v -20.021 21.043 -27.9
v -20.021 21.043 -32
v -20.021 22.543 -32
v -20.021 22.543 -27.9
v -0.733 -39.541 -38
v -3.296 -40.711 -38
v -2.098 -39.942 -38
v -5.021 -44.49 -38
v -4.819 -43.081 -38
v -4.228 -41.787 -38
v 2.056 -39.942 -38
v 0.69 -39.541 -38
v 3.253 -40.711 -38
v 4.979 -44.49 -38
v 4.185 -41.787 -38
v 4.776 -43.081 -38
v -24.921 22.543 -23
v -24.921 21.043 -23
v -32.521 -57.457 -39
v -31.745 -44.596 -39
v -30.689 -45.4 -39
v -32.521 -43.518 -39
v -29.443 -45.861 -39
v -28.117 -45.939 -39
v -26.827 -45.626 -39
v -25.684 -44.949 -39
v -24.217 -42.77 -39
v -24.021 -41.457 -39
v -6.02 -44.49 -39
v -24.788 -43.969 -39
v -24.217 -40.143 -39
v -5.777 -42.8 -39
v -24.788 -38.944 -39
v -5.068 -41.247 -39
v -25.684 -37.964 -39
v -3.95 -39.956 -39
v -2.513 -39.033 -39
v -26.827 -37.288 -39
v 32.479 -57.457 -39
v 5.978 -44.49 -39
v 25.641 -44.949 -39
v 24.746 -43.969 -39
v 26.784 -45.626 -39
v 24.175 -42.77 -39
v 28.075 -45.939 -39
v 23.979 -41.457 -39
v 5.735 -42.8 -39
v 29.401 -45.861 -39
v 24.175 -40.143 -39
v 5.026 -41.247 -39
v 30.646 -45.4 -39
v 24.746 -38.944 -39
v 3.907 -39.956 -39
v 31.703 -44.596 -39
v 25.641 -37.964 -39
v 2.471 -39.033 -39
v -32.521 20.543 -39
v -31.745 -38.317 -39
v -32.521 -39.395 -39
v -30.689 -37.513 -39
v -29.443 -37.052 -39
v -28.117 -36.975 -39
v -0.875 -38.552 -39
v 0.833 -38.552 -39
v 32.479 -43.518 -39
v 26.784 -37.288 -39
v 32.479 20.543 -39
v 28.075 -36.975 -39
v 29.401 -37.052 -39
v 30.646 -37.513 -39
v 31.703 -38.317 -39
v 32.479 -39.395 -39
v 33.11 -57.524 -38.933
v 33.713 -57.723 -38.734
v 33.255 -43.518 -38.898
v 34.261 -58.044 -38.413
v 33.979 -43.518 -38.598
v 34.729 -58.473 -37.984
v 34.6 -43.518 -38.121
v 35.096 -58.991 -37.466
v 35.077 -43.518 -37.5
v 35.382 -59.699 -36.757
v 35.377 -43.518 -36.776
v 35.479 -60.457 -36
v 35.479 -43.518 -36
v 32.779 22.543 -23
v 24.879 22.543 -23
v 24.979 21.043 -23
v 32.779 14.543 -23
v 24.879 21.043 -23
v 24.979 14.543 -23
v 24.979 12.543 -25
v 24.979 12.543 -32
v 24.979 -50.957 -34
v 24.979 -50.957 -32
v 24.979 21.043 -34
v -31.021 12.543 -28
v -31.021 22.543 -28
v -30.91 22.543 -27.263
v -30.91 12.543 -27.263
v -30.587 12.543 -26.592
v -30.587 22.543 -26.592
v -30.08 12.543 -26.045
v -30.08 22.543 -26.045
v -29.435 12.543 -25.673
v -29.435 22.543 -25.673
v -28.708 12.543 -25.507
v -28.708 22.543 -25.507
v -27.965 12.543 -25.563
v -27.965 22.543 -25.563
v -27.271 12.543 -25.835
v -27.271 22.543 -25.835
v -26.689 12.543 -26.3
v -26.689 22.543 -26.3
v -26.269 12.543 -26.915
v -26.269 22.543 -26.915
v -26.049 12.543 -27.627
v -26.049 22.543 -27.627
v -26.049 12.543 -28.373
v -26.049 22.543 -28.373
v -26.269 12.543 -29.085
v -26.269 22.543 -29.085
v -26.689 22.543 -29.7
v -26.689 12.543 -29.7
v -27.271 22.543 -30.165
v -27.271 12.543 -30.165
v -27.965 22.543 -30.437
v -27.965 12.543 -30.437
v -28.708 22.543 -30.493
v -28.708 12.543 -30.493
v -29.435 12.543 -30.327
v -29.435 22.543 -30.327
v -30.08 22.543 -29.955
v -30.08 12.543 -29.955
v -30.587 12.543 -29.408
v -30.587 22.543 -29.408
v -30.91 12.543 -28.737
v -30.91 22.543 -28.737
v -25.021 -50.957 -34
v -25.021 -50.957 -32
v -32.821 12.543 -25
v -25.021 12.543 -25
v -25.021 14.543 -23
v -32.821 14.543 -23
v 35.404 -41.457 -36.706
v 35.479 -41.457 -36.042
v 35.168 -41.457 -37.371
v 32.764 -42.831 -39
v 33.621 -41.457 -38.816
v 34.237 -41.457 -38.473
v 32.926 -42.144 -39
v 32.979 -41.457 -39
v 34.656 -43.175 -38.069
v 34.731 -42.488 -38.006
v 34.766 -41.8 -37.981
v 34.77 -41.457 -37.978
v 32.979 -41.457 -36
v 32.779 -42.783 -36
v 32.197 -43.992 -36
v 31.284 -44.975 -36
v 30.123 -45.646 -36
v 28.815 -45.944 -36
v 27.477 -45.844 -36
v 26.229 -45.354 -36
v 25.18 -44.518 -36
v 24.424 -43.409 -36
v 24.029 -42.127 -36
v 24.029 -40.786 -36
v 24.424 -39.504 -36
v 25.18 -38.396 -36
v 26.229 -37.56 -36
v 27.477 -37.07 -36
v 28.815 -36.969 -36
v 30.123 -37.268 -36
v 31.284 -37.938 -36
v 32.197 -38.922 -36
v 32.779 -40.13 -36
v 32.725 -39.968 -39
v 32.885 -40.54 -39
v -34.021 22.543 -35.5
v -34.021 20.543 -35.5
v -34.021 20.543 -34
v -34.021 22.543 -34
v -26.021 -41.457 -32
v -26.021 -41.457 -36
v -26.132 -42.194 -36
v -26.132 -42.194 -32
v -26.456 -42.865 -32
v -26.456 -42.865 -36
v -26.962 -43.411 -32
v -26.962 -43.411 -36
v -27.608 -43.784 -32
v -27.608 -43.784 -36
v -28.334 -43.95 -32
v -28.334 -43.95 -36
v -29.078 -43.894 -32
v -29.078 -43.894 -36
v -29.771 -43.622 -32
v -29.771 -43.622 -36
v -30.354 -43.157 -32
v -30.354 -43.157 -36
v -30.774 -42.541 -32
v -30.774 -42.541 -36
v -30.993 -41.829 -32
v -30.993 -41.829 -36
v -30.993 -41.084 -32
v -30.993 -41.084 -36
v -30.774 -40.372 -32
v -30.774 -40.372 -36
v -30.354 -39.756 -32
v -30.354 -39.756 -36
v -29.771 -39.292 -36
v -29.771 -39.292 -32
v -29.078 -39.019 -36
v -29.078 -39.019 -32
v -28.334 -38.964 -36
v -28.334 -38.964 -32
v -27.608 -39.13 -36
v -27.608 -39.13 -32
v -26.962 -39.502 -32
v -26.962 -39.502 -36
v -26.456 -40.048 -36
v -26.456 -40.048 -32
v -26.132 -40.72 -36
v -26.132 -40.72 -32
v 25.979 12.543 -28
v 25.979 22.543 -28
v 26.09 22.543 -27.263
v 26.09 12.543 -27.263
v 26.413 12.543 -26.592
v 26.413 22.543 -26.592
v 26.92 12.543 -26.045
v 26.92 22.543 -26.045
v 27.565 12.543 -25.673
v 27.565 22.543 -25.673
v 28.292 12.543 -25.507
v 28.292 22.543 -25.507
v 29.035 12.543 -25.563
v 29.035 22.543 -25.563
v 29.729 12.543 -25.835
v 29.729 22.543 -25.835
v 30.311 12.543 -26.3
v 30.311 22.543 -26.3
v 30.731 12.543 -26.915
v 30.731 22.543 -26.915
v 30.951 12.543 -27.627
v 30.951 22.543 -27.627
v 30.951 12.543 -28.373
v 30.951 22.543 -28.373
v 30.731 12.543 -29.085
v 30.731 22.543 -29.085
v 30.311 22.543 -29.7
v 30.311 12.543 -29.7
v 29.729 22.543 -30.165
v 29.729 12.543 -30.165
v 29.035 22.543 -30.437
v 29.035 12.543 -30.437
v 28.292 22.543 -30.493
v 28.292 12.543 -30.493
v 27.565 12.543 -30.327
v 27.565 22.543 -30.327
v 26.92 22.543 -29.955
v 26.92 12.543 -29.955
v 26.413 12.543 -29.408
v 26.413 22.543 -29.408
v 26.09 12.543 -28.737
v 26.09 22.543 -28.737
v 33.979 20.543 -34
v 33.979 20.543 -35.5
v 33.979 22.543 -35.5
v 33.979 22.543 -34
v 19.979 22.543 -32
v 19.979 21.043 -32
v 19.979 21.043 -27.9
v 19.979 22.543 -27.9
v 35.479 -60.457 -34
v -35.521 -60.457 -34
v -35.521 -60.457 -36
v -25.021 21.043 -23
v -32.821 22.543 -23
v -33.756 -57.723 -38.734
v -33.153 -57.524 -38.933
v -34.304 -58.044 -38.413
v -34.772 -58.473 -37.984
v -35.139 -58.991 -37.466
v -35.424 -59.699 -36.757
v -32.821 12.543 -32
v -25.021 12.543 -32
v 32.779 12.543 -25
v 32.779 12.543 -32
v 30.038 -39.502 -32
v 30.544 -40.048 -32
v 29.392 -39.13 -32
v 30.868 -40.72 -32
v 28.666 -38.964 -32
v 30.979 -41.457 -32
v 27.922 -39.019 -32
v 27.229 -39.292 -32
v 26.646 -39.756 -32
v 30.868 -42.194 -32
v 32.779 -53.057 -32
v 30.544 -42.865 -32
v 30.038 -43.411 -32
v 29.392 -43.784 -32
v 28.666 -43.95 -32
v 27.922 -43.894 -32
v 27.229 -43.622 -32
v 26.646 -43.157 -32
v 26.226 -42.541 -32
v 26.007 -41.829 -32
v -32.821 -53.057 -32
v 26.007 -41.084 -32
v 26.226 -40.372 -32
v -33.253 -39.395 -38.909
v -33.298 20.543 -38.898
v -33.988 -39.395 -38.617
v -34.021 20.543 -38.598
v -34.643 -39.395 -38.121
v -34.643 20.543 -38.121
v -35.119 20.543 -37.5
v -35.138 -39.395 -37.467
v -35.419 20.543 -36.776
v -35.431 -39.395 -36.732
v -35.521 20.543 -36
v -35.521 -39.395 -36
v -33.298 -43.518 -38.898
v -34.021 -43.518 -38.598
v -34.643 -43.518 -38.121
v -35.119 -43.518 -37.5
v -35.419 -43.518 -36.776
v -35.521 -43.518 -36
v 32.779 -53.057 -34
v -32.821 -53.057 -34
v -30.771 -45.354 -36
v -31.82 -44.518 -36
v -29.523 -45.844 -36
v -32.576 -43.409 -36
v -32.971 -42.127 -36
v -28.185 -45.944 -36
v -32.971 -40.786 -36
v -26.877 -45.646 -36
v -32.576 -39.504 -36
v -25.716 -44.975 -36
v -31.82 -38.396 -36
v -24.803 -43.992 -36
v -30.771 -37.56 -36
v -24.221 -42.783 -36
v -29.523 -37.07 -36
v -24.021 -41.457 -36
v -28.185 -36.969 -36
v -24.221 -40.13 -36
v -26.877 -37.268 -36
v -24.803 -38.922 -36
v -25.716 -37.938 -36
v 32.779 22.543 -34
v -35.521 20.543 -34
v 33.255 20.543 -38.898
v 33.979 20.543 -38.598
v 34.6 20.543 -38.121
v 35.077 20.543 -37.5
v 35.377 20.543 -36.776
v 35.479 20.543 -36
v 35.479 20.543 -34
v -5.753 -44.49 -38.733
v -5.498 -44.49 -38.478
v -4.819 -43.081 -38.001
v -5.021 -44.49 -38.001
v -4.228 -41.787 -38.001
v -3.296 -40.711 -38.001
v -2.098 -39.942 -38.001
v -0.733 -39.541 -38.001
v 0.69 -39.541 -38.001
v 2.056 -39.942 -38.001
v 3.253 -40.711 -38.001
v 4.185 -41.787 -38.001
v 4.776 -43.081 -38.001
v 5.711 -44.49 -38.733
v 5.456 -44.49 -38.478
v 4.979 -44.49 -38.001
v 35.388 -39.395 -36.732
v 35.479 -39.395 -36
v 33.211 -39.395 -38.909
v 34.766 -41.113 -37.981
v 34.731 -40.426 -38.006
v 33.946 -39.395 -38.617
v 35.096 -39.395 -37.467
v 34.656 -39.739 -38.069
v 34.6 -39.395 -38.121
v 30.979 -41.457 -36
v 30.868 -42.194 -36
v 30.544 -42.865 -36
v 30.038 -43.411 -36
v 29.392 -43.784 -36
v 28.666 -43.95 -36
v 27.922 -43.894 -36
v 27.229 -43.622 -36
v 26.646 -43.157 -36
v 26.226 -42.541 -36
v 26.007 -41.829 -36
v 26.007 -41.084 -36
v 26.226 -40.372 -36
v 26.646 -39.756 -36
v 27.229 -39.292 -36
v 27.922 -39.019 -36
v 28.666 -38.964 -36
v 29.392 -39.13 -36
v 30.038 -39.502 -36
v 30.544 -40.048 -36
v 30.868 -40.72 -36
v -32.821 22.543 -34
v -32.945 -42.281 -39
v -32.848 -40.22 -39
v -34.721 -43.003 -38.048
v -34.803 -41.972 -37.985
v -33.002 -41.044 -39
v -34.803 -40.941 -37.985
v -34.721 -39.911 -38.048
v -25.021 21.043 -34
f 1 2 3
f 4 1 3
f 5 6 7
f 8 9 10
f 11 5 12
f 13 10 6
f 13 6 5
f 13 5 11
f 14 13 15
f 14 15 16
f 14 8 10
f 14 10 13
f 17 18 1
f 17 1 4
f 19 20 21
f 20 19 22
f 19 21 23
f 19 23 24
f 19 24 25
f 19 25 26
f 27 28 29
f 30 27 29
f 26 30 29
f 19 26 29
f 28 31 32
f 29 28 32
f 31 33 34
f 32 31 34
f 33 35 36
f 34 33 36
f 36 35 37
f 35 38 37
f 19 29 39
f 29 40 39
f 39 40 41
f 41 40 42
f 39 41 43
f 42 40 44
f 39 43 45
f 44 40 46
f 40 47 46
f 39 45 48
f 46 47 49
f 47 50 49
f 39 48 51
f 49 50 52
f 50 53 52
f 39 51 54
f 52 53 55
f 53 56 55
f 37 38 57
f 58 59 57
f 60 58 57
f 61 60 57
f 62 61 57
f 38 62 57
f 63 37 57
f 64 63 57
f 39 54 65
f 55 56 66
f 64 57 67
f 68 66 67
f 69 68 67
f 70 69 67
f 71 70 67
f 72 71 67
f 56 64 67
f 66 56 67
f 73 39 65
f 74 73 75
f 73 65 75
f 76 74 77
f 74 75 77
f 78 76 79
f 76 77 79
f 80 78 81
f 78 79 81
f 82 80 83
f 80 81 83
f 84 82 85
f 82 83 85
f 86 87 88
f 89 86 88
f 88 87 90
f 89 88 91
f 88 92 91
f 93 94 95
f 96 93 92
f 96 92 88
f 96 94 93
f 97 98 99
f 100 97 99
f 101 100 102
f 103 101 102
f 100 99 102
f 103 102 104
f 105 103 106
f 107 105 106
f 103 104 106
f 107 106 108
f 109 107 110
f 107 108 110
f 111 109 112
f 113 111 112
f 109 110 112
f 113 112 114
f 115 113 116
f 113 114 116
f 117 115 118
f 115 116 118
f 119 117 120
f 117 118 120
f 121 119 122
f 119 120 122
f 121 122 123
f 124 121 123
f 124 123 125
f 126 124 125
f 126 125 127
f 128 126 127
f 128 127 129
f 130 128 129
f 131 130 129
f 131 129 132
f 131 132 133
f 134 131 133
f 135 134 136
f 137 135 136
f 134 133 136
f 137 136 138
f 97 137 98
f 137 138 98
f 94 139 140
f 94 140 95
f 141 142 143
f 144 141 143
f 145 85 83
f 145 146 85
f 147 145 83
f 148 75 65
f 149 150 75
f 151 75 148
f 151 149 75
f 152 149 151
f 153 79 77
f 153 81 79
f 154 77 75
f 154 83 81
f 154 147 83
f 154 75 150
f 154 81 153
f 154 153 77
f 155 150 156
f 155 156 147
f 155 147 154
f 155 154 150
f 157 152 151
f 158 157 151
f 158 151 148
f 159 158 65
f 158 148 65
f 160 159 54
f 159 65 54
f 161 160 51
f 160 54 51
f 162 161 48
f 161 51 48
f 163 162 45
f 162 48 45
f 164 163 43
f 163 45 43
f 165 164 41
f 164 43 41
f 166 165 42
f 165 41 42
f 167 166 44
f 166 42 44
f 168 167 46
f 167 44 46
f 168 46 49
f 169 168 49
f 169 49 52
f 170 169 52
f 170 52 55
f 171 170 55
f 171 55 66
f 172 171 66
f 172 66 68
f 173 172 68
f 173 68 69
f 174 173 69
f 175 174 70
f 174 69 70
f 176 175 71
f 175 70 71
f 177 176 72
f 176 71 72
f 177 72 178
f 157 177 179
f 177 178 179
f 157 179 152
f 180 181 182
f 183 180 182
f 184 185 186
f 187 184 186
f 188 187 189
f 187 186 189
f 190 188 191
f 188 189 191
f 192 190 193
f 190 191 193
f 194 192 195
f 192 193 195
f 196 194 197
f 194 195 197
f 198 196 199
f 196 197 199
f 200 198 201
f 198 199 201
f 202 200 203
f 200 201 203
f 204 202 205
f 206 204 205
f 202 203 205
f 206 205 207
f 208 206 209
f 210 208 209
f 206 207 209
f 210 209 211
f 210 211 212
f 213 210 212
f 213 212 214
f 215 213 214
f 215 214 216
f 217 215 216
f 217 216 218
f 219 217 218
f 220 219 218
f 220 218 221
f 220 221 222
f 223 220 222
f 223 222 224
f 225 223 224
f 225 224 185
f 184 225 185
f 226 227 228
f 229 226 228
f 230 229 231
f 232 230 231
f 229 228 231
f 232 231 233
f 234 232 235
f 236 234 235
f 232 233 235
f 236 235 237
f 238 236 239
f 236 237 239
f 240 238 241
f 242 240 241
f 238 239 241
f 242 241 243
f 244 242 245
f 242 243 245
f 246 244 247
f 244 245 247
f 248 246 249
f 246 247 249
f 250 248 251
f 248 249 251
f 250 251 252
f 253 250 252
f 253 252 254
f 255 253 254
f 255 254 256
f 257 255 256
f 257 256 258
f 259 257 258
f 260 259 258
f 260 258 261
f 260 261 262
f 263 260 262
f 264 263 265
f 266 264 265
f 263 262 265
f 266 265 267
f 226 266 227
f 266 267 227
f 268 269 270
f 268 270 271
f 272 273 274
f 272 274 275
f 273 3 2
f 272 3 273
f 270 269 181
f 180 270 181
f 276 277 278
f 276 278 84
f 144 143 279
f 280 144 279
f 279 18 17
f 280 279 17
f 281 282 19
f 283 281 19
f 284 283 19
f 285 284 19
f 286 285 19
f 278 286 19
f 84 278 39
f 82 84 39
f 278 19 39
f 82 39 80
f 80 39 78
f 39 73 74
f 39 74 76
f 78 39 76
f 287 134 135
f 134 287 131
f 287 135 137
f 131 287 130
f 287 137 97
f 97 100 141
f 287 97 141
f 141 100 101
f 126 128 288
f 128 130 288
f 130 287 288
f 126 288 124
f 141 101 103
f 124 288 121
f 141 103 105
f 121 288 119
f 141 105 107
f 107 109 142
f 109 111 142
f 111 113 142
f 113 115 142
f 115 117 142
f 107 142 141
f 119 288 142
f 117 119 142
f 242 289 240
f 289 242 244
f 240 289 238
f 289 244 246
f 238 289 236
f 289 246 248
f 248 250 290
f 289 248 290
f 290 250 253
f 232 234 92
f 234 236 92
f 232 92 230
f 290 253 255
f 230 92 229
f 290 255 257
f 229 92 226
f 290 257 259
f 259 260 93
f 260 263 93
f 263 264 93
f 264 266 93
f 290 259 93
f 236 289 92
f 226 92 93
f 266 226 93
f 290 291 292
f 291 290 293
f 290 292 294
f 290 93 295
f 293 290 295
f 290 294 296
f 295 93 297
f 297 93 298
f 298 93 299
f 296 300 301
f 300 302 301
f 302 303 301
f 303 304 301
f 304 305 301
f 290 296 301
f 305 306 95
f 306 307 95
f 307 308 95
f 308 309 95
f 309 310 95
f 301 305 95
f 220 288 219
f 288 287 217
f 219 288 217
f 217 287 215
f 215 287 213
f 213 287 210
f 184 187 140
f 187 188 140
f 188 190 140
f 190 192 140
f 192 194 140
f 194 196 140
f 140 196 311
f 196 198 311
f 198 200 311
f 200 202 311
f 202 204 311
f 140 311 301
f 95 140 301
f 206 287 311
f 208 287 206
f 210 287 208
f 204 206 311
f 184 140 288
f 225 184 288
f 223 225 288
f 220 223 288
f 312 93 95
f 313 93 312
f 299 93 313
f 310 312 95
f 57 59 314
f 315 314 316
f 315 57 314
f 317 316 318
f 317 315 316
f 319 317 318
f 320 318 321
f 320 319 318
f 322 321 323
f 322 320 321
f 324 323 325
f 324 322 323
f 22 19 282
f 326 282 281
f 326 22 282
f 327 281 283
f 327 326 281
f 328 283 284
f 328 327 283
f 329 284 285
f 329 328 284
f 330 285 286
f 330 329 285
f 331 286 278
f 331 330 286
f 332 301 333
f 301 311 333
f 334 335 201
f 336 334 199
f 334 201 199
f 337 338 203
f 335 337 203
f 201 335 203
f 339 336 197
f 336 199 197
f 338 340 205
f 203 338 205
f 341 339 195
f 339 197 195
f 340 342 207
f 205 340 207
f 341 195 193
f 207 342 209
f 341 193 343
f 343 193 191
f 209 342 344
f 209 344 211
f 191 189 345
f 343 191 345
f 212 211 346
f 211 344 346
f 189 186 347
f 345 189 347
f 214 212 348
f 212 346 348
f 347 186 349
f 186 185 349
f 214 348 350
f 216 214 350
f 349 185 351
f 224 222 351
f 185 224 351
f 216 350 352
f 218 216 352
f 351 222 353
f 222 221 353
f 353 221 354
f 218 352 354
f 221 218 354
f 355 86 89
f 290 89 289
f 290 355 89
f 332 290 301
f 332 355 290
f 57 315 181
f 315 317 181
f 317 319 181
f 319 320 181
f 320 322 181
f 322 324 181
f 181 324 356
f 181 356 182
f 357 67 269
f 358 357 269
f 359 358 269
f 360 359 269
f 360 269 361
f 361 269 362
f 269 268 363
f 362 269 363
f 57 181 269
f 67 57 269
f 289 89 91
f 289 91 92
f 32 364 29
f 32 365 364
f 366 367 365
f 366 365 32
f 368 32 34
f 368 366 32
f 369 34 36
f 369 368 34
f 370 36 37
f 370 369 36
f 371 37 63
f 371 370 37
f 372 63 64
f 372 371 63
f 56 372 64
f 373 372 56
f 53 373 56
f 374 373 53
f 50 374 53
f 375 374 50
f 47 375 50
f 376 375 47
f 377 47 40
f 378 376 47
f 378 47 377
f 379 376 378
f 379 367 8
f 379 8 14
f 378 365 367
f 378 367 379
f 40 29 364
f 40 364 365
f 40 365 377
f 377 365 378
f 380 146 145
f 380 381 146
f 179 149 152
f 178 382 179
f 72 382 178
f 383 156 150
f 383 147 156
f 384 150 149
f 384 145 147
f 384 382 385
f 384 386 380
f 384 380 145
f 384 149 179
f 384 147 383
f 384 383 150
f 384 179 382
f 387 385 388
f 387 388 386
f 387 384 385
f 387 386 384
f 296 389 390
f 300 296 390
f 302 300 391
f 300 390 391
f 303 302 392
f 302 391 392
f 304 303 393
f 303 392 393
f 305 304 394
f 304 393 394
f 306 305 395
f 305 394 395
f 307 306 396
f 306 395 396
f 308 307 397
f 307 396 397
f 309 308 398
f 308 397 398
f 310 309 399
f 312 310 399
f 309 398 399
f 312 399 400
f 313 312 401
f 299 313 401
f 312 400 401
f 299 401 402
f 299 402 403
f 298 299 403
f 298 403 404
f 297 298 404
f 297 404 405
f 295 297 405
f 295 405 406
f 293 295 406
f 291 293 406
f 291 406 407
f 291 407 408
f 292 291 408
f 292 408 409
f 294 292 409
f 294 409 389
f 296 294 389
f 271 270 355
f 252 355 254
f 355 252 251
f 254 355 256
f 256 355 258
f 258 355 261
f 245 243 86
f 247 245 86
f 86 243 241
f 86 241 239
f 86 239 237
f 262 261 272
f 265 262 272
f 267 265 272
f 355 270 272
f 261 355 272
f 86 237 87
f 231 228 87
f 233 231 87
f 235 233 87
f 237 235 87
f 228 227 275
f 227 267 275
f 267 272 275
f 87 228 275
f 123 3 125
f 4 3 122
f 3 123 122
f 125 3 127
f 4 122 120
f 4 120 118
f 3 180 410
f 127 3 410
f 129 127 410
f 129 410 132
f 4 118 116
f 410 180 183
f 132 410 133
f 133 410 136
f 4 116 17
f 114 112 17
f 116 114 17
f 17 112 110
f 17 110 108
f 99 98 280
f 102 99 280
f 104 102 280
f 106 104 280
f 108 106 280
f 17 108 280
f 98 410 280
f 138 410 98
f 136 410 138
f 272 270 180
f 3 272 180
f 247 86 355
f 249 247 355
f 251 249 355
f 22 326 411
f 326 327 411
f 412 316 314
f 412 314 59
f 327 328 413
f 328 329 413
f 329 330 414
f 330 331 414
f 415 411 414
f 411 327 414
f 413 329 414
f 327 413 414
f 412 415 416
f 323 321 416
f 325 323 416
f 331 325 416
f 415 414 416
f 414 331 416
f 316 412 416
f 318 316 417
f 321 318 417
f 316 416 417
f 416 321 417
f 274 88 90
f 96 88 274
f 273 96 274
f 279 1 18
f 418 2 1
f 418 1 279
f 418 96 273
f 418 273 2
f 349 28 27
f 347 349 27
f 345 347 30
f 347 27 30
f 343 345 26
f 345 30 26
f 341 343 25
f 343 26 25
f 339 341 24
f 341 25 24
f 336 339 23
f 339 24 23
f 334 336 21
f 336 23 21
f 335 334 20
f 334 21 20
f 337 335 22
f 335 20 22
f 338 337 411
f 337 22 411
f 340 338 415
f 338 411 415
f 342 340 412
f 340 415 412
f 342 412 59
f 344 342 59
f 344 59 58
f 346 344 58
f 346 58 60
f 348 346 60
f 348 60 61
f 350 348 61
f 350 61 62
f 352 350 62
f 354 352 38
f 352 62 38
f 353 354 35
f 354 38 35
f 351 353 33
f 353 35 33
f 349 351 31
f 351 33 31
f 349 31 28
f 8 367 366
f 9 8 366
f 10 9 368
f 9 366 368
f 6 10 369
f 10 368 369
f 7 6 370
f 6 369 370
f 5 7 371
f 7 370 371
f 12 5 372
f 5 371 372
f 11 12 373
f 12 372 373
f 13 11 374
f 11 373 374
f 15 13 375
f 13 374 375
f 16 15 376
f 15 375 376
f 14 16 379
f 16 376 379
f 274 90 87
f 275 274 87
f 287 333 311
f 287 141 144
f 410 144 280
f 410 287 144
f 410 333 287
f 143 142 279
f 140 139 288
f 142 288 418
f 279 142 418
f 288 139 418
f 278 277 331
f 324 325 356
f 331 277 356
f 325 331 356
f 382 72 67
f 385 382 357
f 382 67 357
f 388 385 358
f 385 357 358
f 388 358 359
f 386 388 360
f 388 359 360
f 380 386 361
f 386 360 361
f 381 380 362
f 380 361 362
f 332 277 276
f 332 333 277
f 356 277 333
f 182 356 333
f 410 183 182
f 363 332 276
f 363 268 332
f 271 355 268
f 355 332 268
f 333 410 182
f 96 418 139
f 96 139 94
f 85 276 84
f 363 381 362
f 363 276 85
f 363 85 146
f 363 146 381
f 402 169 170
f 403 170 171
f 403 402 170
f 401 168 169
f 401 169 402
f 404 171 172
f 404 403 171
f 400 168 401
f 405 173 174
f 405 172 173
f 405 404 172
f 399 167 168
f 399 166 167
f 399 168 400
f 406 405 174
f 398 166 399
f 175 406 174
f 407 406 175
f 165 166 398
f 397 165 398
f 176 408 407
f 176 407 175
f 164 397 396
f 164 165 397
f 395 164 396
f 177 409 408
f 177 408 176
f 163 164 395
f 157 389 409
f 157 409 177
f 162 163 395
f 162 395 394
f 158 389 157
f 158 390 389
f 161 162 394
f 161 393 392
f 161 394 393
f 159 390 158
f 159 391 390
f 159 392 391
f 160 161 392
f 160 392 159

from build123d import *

# Parameters (mm, degrees)
SKETCH028_W        = 71
SKETCH028_H        = 81
PAD014_DEPTH       = 5
SKETCH034_W        = 68
SKETCH034_H        = 1.5
PAD017_DEPTH       = 2
SKETCH035_W        = 64.6
SKETCH035_H        = 77.6
PAD018_DEPTH       = 2
SKETCH036_W        = 50
SKETCH036_H        = 72
POCKET028_DEPTH    = 4
SKETCH039_W        = 7.3
SKETCH039_H        = 10
PAD020_DEPTH       = 9
SKETCH040_W        = 5
SKETCH040_H        = 3.5
PAD021_DEPTH       = 9
CHAMFER006_SIZE    = 4.9
SKETCH041_R        = 2.5
POCKET031_DEPTH    = 10
SKETCH047_R        = 2.5
POCKET043_DEPTH    = 10
SKETCH051_R        = 4.5
POCKET044_DEPTH    = 3
POCKET044_FACE29_W = 64.6
POCKET044_FACE29_H = 2
POCKET045_DEPTH    = 2
POCKET045_FACE16_W = 50
POCKET045_FACE16_H = 4
PAD035_DEPTH       = 2
POCKET046_DEPTH    = 2
CHAMFER012_SIZE    = 3
CHAMFER018_SIZE    = 2
SKETCH063_W        = 50
SKETCH063_H        = 72
PAD040_DEPTH       = 2
PAD040_FACE37_W    = 0.5
PAD040_FACE37_H    = 50
POCKET056_DEPTH    = 0.5
PAD042_DEPTH       = 0.5
PAD043_DEPTH       = 0.5
POCKET064_DEPTH    = 1
CHAMFER022_SIZE    = 0.999
FILLET006_R        = 3


with BuildPart() as part:
    # Sketch028 → Pad014 (new body)
    with BuildSketch(Plane.XY):
        with Locations((-0.121221, -9.466726)):
            Rectangle(SKETCH028_W, SKETCH028_H)
    extrude(amount=-PAD014_DEPTH)

    # Sketch034 (on Face1 of Pad014) → Pad017 (join)
    with BuildSketch(Plane(origin=(0, 31.033274, 0), x_dir=(-1, 0, 0), z_dir=(0, 1, 0))):
        with Locations((0.121221, -0.75)):
            Rectangle(SKETCH034_W, SKETCH034_H)
    extrude(amount=PAD017_DEPTH)

    # Sketch035 (on Face10 of Pad017) → Pad018 (join)
    with BuildSketch(Plane.XY):
        with Locations((-0.121221, -5.766726)):
            Rectangle(SKETCH035_W, SKETCH035_H)
    extrude(amount=PAD018_DEPTH)

    # Sketch036 (on Face13 of Pad018) → Pocket028 (cut)
    with BuildSketch(Plane.XY.offset(2)):
        with Locations((-0.121221, -6.466726)):
            Rectangle(SKETCH036_W, SKETCH036_H)
    extrude(amount=-POCKET028_DEPTH, mode=Mode.SUBTRACT)

    # Sketch039 (on Face14 of Pocket028) → Pad020 (join)
    with BuildSketch(Plane.XY.offset(2)):
        with Locations((28.528779, 28.033274)):
            Rectangle(SKETCH039_W, SKETCH039_H)
        with Locations((-28.771221, 28.033274)):
            Rectangle(SKETCH039_W, SKETCH039_H)
    extrude(amount=PAD020_DEPTH)

    # Sketch040 (on Face1 of Pad020) → Pad021 (join)
    with BuildSketch(Plane.XY.offset(2)):
        with Locations((-22.621221, 31.283274)):
            Rectangle(SKETCH040_W, SKETCH040_H)
        with Locations((22.378779, 31.283274)):
            Rectangle(SKETCH040_W, SKETCH040_H)
    extrude(amount=PAD021_DEPTH)

    # Chamfer006
    chamfer006_edges = [part.edges().sort_by_distance(p)[0] for p in [
        (-20.121221, 31.283274, 11),
        (19.878779, 31.283274, 11),
    ]]
    chamfer(chamfer006_edges, length=CHAMFER006_SIZE)

    # Sketch041 (on Face12 of Chamfer006) → Pocket031 (cut)
    with BuildSketch(Plane(origin=(0, 33.033274, 0), x_dir=(-1, 0, 0), z_dir=(0, 1, 0))):
        with Locations((-28.378779, 6)):
            Circle(SKETCH041_R)
        with Locations((28.621221, 6)):
            Circle(SKETCH041_R)
    extrude(amount=-POCKET031_DEPTH, mode=Mode.SUBTRACT)

    # Sketch047 (on Face30 of Pocket031) → Pocket043 (cut)
    with BuildSketch(Plane(origin=(0, 0, -5), x_dir=(1, 0, 0), z_dir=(0, 0, -1))):
        with Locations((-28.621221, 30.966726)):
            Circle(SKETCH047_R)
        with Locations((28.378779, 30.966726)):
            Circle(SKETCH047_R)
    extrude(amount=-POCKET043_DEPTH, mode=Mode.SUBTRACT)

    # Sketch051 (on Face32 of Pocket043) → Pocket044 (cut)
    with BuildSketch(Plane(origin=(0, 0, -5), x_dir=(1, 0, 0), z_dir=(0, 0, -1))):
        with Locations((-28.621221, 30.966726)):
            Circle(SKETCH051_R)
        with Locations((28.378779, 30.966726)):
            Circle(SKETCH051_R)
    extrude(amount=-POCKET044_DEPTH, mode=Mode.SUBTRACT)

    # Pocket044 Face29 → Pocket045 (cut)
    with BuildSketch(Plane(origin=(-0.121221, -44.566726, 1), x_dir=(-1, 0, 0), z_dir=(0, -1, 0))):
        Rectangle(POCKET044_FACE29_W, POCKET044_FACE29_H)
    extrude(amount=-POCKET045_DEPTH, mode=Mode.SUBTRACT)

    # Pocket045 Face16 → Pad035 (add)
    with BuildSketch(Plane(origin=(-0.121221, -42.466726, 0), x_dir=(1, 0, 0), z_dir=(0, 1, 0))):
        Rectangle(POCKET045_FACE16_W, POCKET045_FACE16_H)
    extrude(amount=PAD035_DEPTH)

    # Pad035 Face1 → Pocket046 (cut)
    with BuildSketch(Plane(origin=(-0.121221, 29.533274, 1.353834), x_dir=(-1, 0, 0), z_dir=(0, -1, 0))):
        Polygon((-25, -9.646166), (-24.9, -9.646166), (-20, -4.746166), (-20, -0.646166), (20, -0.646166), (20, -4.746166), (24.9, -9.646166), (25, -9.646166), (25, 3.353834), (-25, 3.353834), align=None)
    extrude(amount=-POCKET046_DEPTH, mode=Mode.SUBTRACT)

    # Chamfer012
    chamfer012_edges = [part.edges().sort_by_distance(p)[0] for p in [
        (-0.121221, -49.966726, -5),
    ]]
    chamfer(chamfer012_edges, length=CHAMFER012_SIZE)

    # Chamfer018
    chamfer018_edges = [part.edges().sort_by_distance(p)[0] for p in [
        (-28.771221, 23.033274, 11),
        (28.528779, 23.033274, 11),
    ]]
    chamfer(chamfer018_edges, length=CHAMFER018_SIZE)

    # Sketch063 (on Face10 of Chamfer018) → Pad040 (join)
    with BuildSketch(Plane.XY.offset(-2)):
        with Locations((-0.121221, -4.466726)):
            Rectangle(SKETCH063_W, SKETCH063_H)
    extrude(amount=PAD040_DEPTH)

    # Pad040 Face37 → Pocket056 (cut)
    with BuildSketch(Plane(origin=(-0.121221, 31.283274, -2), x_dir=(0, -1, 0), z_dir=(0, 0, -1))):
        Rectangle(PAD040_FACE37_W, PAD040_FACE37_H)
    extrude(amount=-POCKET056_DEPTH, mode=Mode.SUBTRACT)

    # Pocket056 Face9 → Pad042 (add)
    with BuildSketch(Plane(origin=(-32.421221, 7.336396, 2.99136), x_dir=(0, 1, 0), z_dir=(-1, 0, 0))):
        Polygon((17.696878, -8.00864), (25.696878, -8.00864), (25.696878, 2.99136), (-49.903122, 2.99136), (-49.903122, 0.99136), (15.696878, 0.99136), (15.696878, -6.00864), align=None)
    extrude(amount=PAD042_DEPTH)

    # Pad042 Face19 → Pad043 (add)
    with BuildSketch(Plane(origin=(32.178779, 7.336396, 2.99136), x_dir=(0, -1, 0), z_dir=(1, 0, 0))):
        Polygon((-15.696878, -6.00864), (-15.696878, 0.99136), (49.903122, 0.99136), (49.903122, 2.99136), (-25.696878, 2.99136), (-25.696878, -8.00864), (-17.696878, -8.00864), align=None)
    extrude(amount=PAD043_DEPTH)

    # Sketch066 (on Face22 of Pad043) → Pocket064 (cut)
    with BuildSketch(Plane(origin=(0, 0, -5), x_dir=(1, 0, 0), z_dir=(0, 0, -1))):
        with BuildLine():
            ThreePointArc((-5.121221, 34), (-0.121221, 28.999784), (4.878779, 34))
            Line((-5.121221, 34), (4.878779, 34))
        make_face()
    extrude(amount=-POCKET064_DEPTH, mode=Mode.SUBTRACT)

    # Chamfer022
    chamfer022_edges = [part.edges().sort_by_distance(p)[0] for p in [
        (-0.121221, -28.999784, -5),
    ]]
    chamfer(chamfer022_edges, length=CHAMFER022_SIZE)

    # Fillet006
    fillet006_edges = [part.edges().sort_by_distance(p)[0] for p in [
        (-35.621221, -7.966726, -5),
        (35.378779, -7.966726, -5),
    ]]
    fillet(fillet006_edges, radius=FILLET006_R)


with BuildPart() as part_1:
    # Body004 placement: moved
    add(part.part.moved(Location((0.1, -10.49, -34))))


solid = part_1.part
